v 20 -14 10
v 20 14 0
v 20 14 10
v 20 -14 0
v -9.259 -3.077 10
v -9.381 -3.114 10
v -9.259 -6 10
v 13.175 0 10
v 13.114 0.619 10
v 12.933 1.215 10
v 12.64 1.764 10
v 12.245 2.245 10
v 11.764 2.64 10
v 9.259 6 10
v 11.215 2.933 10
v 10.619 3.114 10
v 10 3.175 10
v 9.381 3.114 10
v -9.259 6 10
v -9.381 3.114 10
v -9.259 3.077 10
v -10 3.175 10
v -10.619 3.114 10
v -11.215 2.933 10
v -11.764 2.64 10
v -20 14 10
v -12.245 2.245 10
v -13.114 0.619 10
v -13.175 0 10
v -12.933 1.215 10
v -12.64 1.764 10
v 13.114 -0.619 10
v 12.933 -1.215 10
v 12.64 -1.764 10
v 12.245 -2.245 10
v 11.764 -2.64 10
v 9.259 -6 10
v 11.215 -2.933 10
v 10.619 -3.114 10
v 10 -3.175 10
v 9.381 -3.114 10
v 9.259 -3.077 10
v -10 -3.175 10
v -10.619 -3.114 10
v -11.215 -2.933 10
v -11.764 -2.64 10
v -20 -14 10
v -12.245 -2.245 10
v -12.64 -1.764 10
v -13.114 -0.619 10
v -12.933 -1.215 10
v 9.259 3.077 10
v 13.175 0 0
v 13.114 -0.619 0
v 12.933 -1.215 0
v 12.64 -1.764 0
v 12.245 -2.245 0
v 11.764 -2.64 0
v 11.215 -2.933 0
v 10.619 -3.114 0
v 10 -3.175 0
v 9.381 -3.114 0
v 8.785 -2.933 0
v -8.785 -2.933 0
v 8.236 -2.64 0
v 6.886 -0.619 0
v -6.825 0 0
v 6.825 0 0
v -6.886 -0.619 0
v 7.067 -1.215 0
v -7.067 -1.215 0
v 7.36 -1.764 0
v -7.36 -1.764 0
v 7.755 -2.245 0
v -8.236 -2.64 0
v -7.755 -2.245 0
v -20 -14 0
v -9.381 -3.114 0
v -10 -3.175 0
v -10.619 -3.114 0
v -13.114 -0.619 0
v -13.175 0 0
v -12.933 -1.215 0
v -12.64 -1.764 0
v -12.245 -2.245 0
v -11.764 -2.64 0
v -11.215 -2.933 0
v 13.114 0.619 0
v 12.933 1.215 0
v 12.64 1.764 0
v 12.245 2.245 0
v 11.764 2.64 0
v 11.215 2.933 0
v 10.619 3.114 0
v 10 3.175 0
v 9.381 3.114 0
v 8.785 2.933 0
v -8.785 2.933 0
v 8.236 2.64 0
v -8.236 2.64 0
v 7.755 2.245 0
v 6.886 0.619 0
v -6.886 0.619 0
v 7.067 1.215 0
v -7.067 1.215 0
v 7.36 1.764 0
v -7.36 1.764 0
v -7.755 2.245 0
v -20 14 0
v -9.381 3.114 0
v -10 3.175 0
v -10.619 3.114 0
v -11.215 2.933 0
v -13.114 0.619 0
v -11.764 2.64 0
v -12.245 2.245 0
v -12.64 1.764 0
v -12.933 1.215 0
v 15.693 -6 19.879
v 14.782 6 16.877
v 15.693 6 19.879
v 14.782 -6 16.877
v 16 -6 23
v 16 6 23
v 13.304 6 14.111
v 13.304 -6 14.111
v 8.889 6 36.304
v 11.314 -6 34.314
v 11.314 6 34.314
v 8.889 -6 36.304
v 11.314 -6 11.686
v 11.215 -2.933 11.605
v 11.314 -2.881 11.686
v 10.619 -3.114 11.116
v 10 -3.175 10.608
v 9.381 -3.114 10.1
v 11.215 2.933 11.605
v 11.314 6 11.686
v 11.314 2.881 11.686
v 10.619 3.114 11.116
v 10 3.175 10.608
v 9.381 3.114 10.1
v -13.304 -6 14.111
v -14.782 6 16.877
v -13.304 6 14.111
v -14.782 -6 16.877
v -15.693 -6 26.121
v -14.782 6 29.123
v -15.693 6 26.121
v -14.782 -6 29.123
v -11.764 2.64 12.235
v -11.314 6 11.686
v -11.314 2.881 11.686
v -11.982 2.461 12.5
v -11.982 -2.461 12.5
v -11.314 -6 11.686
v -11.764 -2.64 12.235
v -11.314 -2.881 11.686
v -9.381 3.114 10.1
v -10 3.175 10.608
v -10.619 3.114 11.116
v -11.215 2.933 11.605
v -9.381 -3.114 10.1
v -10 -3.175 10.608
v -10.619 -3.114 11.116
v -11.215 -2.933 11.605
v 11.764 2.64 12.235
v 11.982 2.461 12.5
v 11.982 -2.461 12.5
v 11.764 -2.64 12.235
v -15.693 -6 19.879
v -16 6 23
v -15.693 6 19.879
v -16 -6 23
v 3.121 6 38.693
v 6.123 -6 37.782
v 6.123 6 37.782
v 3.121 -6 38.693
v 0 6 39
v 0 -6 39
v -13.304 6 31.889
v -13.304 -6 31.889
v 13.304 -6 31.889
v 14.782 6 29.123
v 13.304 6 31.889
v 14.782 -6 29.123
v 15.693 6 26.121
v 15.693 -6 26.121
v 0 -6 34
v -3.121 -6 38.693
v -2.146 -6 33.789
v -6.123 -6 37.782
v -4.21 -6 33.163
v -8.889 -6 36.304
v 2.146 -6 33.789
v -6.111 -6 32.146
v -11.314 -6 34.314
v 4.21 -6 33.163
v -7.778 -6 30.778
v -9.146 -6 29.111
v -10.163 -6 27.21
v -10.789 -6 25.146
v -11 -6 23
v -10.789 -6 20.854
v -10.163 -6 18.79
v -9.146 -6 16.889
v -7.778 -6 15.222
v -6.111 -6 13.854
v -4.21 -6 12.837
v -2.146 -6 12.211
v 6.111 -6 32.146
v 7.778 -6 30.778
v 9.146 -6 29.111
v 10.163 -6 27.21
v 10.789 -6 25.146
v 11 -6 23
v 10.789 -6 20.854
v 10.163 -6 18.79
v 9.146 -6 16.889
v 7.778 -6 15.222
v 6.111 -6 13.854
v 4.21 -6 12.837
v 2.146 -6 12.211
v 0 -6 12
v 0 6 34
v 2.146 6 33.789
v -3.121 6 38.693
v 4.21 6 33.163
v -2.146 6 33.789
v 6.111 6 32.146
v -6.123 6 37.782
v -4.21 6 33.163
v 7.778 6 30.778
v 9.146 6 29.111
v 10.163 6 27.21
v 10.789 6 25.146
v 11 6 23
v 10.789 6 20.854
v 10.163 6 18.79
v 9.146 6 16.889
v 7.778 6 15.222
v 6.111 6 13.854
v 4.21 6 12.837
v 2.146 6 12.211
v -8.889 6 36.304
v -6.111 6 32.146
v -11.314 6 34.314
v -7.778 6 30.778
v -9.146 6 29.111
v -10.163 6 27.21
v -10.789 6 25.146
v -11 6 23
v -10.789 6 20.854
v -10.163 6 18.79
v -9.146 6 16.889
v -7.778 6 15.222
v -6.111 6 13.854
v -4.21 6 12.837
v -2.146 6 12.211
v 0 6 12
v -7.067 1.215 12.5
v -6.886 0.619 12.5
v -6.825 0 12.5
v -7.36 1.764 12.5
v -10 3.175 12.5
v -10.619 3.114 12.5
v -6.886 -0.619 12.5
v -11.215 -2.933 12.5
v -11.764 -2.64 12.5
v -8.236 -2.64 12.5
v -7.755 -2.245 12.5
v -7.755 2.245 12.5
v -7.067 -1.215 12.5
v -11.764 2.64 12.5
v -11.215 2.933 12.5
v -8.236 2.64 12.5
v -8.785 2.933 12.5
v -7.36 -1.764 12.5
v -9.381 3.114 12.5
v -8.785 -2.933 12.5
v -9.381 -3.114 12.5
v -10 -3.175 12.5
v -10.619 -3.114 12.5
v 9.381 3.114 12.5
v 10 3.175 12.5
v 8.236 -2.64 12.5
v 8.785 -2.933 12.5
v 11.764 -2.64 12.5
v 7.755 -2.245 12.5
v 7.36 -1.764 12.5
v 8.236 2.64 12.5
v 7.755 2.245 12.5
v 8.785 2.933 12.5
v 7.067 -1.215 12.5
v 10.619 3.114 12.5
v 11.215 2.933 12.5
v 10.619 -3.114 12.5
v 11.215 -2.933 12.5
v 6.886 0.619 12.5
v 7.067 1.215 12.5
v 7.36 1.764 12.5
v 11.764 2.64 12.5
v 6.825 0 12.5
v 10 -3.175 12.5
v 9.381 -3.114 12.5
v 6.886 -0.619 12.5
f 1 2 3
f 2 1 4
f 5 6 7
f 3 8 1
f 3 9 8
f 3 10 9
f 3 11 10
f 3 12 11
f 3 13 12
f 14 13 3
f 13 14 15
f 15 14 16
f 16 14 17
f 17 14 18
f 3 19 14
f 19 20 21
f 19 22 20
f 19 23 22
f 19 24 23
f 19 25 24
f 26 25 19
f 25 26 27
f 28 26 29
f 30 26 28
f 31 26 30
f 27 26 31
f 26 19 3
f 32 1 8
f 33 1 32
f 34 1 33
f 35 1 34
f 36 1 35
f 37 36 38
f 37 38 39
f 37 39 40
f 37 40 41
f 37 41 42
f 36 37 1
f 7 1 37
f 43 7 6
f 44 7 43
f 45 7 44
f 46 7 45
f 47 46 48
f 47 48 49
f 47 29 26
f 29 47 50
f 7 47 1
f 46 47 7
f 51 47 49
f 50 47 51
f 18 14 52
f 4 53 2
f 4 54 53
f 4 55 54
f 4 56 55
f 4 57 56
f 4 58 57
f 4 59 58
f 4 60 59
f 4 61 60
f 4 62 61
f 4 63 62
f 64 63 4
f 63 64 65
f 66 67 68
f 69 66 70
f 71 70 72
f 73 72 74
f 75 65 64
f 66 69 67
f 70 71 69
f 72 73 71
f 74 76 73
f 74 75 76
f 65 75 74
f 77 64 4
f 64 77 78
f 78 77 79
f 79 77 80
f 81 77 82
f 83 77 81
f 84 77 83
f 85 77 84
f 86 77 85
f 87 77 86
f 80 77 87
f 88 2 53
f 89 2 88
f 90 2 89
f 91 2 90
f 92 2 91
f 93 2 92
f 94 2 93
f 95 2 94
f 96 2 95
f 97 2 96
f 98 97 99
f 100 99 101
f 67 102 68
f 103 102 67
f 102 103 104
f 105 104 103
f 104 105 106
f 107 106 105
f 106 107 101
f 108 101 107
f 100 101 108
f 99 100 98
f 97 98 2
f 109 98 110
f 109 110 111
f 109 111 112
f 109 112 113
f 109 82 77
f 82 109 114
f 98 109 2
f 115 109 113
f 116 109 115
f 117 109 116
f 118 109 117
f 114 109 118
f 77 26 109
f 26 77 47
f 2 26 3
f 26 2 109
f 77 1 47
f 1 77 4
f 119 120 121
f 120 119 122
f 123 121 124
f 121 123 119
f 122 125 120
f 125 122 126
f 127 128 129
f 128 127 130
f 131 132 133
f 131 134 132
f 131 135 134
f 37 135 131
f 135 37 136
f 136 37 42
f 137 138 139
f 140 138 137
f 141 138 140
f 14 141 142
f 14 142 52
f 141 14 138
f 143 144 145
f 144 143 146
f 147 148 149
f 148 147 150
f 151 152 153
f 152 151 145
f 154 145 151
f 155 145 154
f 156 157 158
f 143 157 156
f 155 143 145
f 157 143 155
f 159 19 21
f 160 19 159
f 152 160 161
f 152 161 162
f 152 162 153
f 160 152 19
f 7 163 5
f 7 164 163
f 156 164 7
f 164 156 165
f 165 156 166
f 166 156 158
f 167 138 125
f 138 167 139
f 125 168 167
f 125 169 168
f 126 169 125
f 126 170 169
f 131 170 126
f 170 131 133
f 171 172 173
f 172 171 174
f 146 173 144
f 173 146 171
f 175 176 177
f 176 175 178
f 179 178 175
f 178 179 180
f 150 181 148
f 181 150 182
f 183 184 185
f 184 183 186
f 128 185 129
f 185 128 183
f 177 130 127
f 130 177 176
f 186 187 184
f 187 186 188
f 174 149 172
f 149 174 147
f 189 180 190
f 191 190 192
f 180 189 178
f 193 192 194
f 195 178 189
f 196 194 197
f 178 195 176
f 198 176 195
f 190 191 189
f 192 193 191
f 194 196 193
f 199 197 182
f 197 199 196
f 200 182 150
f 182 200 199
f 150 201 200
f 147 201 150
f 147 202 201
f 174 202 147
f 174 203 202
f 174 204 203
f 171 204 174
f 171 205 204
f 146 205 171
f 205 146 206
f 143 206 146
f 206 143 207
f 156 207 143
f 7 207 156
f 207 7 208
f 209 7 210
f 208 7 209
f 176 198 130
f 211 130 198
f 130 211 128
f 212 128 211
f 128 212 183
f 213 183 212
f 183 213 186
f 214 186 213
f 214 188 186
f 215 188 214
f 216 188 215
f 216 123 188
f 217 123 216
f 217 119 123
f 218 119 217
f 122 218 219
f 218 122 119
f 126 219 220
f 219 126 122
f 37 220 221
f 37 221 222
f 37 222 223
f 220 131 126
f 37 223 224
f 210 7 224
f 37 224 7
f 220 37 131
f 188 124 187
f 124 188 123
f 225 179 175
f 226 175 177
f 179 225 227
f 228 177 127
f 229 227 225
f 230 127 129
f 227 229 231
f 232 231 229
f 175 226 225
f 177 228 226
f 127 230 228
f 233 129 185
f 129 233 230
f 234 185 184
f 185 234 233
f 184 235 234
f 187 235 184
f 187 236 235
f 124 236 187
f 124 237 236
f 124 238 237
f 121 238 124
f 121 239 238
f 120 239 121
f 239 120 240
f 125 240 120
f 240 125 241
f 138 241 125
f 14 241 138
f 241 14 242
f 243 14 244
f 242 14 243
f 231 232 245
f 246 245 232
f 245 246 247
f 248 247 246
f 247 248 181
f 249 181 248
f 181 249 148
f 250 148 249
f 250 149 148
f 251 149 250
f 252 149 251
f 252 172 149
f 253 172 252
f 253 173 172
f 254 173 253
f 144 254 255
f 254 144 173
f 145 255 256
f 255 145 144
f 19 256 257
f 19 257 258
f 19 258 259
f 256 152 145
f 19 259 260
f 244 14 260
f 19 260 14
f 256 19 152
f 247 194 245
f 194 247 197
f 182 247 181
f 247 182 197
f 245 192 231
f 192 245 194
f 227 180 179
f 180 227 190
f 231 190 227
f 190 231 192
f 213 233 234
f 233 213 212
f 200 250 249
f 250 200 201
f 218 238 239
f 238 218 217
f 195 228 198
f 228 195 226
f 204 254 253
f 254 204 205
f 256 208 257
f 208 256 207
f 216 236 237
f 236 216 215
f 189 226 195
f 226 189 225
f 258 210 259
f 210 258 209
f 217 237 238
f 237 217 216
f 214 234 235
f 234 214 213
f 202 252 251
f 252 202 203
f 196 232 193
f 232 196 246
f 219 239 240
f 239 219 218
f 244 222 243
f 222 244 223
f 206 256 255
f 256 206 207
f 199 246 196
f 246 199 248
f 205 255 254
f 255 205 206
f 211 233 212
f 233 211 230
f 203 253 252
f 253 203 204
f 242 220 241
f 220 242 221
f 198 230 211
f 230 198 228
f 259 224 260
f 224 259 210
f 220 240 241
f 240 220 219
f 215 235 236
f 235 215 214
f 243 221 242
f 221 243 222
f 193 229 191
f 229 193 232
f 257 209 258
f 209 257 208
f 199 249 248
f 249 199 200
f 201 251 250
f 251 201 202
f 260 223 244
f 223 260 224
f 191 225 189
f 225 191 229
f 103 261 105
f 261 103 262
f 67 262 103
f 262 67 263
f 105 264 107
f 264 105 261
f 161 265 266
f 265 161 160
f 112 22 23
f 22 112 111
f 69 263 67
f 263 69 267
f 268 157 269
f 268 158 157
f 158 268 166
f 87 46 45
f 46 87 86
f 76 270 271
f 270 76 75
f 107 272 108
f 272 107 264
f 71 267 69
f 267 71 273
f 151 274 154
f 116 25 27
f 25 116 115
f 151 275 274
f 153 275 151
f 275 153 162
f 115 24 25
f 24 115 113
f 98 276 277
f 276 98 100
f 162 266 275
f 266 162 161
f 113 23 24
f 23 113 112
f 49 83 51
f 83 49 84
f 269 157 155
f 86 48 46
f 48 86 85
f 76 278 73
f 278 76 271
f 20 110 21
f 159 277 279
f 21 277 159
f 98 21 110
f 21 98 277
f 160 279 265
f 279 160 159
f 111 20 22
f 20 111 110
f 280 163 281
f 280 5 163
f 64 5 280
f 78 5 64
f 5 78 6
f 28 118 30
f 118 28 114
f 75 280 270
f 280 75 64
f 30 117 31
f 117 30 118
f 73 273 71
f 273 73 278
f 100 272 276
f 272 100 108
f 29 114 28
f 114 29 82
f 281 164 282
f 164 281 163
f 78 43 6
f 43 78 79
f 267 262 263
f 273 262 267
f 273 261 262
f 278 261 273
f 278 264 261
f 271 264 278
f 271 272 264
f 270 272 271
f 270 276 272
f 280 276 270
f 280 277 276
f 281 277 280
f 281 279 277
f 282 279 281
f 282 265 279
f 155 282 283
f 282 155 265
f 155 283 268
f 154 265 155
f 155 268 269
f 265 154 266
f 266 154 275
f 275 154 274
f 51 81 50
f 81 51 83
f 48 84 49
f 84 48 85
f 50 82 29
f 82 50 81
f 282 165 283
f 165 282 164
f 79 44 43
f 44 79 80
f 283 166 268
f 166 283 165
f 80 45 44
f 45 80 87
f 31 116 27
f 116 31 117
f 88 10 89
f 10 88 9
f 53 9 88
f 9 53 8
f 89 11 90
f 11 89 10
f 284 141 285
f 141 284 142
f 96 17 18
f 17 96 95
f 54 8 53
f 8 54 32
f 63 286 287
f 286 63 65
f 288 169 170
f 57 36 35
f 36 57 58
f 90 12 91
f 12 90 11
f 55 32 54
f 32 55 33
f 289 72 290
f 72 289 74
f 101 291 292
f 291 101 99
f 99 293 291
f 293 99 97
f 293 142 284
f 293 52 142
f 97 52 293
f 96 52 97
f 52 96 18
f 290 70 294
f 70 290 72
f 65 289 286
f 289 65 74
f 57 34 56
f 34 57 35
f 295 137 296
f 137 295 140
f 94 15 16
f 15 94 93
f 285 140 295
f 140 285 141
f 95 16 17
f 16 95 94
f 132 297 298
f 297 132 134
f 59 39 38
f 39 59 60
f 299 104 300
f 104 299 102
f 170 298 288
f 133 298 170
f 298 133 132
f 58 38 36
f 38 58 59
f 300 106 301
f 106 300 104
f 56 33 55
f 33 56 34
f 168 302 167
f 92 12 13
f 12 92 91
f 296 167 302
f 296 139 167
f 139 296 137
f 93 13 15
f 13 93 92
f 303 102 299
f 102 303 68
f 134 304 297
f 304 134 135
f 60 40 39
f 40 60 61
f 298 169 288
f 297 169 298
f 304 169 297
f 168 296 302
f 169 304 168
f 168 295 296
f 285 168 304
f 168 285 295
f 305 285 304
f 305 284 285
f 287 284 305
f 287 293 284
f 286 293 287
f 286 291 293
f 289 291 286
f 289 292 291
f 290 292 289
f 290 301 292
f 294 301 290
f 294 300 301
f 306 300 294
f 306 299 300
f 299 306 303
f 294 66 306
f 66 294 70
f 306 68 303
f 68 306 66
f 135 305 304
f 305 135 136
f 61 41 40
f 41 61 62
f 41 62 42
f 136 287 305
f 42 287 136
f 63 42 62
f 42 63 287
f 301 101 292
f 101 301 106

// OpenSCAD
$fn = 32;

// ----------------------------------------------------------------------
// Deck eye: 32 mm eye on a 40 mm base
// ----------------------------------------------------------------------

// --- parameters (mm) ---
base_l = 40;              // base length
base_w = 28;              // base width
base_t = 10;              // base thickness
eye_r = 16;               // eye outside radius
eye_bore = 22;            // eye bore diameter
eye_w = 12;               // eye thickness
eye_z = 23;               // eye centre height
holes_d = 6.35;           // fixing holes
hole_x = 10;              // fixing hole spacing

difference() {
  union() {
    translate([-20, -14, 0]) cube([base_l, base_w, base_t]);
    /* eye standing upright, its foot sunk 3 mm into the base */
    translate([0, -6, 23]) rotate([-90, 0, 0]) cylinder(h = 12, d = 32);
  }
  /* eye bore, 2.5 mm clear of both faces */
  translate([0, -8.5, 23]) rotate([-90, 0, 0]) cylinder(h = 17, d = 22);
  translate([-10, 0, -2.5]) cylinder(h = base_t + 5, d = holes_d);
  translate([10, 0, -2.5]) cylinder(h = base_t + 5, d = holes_d);
}
